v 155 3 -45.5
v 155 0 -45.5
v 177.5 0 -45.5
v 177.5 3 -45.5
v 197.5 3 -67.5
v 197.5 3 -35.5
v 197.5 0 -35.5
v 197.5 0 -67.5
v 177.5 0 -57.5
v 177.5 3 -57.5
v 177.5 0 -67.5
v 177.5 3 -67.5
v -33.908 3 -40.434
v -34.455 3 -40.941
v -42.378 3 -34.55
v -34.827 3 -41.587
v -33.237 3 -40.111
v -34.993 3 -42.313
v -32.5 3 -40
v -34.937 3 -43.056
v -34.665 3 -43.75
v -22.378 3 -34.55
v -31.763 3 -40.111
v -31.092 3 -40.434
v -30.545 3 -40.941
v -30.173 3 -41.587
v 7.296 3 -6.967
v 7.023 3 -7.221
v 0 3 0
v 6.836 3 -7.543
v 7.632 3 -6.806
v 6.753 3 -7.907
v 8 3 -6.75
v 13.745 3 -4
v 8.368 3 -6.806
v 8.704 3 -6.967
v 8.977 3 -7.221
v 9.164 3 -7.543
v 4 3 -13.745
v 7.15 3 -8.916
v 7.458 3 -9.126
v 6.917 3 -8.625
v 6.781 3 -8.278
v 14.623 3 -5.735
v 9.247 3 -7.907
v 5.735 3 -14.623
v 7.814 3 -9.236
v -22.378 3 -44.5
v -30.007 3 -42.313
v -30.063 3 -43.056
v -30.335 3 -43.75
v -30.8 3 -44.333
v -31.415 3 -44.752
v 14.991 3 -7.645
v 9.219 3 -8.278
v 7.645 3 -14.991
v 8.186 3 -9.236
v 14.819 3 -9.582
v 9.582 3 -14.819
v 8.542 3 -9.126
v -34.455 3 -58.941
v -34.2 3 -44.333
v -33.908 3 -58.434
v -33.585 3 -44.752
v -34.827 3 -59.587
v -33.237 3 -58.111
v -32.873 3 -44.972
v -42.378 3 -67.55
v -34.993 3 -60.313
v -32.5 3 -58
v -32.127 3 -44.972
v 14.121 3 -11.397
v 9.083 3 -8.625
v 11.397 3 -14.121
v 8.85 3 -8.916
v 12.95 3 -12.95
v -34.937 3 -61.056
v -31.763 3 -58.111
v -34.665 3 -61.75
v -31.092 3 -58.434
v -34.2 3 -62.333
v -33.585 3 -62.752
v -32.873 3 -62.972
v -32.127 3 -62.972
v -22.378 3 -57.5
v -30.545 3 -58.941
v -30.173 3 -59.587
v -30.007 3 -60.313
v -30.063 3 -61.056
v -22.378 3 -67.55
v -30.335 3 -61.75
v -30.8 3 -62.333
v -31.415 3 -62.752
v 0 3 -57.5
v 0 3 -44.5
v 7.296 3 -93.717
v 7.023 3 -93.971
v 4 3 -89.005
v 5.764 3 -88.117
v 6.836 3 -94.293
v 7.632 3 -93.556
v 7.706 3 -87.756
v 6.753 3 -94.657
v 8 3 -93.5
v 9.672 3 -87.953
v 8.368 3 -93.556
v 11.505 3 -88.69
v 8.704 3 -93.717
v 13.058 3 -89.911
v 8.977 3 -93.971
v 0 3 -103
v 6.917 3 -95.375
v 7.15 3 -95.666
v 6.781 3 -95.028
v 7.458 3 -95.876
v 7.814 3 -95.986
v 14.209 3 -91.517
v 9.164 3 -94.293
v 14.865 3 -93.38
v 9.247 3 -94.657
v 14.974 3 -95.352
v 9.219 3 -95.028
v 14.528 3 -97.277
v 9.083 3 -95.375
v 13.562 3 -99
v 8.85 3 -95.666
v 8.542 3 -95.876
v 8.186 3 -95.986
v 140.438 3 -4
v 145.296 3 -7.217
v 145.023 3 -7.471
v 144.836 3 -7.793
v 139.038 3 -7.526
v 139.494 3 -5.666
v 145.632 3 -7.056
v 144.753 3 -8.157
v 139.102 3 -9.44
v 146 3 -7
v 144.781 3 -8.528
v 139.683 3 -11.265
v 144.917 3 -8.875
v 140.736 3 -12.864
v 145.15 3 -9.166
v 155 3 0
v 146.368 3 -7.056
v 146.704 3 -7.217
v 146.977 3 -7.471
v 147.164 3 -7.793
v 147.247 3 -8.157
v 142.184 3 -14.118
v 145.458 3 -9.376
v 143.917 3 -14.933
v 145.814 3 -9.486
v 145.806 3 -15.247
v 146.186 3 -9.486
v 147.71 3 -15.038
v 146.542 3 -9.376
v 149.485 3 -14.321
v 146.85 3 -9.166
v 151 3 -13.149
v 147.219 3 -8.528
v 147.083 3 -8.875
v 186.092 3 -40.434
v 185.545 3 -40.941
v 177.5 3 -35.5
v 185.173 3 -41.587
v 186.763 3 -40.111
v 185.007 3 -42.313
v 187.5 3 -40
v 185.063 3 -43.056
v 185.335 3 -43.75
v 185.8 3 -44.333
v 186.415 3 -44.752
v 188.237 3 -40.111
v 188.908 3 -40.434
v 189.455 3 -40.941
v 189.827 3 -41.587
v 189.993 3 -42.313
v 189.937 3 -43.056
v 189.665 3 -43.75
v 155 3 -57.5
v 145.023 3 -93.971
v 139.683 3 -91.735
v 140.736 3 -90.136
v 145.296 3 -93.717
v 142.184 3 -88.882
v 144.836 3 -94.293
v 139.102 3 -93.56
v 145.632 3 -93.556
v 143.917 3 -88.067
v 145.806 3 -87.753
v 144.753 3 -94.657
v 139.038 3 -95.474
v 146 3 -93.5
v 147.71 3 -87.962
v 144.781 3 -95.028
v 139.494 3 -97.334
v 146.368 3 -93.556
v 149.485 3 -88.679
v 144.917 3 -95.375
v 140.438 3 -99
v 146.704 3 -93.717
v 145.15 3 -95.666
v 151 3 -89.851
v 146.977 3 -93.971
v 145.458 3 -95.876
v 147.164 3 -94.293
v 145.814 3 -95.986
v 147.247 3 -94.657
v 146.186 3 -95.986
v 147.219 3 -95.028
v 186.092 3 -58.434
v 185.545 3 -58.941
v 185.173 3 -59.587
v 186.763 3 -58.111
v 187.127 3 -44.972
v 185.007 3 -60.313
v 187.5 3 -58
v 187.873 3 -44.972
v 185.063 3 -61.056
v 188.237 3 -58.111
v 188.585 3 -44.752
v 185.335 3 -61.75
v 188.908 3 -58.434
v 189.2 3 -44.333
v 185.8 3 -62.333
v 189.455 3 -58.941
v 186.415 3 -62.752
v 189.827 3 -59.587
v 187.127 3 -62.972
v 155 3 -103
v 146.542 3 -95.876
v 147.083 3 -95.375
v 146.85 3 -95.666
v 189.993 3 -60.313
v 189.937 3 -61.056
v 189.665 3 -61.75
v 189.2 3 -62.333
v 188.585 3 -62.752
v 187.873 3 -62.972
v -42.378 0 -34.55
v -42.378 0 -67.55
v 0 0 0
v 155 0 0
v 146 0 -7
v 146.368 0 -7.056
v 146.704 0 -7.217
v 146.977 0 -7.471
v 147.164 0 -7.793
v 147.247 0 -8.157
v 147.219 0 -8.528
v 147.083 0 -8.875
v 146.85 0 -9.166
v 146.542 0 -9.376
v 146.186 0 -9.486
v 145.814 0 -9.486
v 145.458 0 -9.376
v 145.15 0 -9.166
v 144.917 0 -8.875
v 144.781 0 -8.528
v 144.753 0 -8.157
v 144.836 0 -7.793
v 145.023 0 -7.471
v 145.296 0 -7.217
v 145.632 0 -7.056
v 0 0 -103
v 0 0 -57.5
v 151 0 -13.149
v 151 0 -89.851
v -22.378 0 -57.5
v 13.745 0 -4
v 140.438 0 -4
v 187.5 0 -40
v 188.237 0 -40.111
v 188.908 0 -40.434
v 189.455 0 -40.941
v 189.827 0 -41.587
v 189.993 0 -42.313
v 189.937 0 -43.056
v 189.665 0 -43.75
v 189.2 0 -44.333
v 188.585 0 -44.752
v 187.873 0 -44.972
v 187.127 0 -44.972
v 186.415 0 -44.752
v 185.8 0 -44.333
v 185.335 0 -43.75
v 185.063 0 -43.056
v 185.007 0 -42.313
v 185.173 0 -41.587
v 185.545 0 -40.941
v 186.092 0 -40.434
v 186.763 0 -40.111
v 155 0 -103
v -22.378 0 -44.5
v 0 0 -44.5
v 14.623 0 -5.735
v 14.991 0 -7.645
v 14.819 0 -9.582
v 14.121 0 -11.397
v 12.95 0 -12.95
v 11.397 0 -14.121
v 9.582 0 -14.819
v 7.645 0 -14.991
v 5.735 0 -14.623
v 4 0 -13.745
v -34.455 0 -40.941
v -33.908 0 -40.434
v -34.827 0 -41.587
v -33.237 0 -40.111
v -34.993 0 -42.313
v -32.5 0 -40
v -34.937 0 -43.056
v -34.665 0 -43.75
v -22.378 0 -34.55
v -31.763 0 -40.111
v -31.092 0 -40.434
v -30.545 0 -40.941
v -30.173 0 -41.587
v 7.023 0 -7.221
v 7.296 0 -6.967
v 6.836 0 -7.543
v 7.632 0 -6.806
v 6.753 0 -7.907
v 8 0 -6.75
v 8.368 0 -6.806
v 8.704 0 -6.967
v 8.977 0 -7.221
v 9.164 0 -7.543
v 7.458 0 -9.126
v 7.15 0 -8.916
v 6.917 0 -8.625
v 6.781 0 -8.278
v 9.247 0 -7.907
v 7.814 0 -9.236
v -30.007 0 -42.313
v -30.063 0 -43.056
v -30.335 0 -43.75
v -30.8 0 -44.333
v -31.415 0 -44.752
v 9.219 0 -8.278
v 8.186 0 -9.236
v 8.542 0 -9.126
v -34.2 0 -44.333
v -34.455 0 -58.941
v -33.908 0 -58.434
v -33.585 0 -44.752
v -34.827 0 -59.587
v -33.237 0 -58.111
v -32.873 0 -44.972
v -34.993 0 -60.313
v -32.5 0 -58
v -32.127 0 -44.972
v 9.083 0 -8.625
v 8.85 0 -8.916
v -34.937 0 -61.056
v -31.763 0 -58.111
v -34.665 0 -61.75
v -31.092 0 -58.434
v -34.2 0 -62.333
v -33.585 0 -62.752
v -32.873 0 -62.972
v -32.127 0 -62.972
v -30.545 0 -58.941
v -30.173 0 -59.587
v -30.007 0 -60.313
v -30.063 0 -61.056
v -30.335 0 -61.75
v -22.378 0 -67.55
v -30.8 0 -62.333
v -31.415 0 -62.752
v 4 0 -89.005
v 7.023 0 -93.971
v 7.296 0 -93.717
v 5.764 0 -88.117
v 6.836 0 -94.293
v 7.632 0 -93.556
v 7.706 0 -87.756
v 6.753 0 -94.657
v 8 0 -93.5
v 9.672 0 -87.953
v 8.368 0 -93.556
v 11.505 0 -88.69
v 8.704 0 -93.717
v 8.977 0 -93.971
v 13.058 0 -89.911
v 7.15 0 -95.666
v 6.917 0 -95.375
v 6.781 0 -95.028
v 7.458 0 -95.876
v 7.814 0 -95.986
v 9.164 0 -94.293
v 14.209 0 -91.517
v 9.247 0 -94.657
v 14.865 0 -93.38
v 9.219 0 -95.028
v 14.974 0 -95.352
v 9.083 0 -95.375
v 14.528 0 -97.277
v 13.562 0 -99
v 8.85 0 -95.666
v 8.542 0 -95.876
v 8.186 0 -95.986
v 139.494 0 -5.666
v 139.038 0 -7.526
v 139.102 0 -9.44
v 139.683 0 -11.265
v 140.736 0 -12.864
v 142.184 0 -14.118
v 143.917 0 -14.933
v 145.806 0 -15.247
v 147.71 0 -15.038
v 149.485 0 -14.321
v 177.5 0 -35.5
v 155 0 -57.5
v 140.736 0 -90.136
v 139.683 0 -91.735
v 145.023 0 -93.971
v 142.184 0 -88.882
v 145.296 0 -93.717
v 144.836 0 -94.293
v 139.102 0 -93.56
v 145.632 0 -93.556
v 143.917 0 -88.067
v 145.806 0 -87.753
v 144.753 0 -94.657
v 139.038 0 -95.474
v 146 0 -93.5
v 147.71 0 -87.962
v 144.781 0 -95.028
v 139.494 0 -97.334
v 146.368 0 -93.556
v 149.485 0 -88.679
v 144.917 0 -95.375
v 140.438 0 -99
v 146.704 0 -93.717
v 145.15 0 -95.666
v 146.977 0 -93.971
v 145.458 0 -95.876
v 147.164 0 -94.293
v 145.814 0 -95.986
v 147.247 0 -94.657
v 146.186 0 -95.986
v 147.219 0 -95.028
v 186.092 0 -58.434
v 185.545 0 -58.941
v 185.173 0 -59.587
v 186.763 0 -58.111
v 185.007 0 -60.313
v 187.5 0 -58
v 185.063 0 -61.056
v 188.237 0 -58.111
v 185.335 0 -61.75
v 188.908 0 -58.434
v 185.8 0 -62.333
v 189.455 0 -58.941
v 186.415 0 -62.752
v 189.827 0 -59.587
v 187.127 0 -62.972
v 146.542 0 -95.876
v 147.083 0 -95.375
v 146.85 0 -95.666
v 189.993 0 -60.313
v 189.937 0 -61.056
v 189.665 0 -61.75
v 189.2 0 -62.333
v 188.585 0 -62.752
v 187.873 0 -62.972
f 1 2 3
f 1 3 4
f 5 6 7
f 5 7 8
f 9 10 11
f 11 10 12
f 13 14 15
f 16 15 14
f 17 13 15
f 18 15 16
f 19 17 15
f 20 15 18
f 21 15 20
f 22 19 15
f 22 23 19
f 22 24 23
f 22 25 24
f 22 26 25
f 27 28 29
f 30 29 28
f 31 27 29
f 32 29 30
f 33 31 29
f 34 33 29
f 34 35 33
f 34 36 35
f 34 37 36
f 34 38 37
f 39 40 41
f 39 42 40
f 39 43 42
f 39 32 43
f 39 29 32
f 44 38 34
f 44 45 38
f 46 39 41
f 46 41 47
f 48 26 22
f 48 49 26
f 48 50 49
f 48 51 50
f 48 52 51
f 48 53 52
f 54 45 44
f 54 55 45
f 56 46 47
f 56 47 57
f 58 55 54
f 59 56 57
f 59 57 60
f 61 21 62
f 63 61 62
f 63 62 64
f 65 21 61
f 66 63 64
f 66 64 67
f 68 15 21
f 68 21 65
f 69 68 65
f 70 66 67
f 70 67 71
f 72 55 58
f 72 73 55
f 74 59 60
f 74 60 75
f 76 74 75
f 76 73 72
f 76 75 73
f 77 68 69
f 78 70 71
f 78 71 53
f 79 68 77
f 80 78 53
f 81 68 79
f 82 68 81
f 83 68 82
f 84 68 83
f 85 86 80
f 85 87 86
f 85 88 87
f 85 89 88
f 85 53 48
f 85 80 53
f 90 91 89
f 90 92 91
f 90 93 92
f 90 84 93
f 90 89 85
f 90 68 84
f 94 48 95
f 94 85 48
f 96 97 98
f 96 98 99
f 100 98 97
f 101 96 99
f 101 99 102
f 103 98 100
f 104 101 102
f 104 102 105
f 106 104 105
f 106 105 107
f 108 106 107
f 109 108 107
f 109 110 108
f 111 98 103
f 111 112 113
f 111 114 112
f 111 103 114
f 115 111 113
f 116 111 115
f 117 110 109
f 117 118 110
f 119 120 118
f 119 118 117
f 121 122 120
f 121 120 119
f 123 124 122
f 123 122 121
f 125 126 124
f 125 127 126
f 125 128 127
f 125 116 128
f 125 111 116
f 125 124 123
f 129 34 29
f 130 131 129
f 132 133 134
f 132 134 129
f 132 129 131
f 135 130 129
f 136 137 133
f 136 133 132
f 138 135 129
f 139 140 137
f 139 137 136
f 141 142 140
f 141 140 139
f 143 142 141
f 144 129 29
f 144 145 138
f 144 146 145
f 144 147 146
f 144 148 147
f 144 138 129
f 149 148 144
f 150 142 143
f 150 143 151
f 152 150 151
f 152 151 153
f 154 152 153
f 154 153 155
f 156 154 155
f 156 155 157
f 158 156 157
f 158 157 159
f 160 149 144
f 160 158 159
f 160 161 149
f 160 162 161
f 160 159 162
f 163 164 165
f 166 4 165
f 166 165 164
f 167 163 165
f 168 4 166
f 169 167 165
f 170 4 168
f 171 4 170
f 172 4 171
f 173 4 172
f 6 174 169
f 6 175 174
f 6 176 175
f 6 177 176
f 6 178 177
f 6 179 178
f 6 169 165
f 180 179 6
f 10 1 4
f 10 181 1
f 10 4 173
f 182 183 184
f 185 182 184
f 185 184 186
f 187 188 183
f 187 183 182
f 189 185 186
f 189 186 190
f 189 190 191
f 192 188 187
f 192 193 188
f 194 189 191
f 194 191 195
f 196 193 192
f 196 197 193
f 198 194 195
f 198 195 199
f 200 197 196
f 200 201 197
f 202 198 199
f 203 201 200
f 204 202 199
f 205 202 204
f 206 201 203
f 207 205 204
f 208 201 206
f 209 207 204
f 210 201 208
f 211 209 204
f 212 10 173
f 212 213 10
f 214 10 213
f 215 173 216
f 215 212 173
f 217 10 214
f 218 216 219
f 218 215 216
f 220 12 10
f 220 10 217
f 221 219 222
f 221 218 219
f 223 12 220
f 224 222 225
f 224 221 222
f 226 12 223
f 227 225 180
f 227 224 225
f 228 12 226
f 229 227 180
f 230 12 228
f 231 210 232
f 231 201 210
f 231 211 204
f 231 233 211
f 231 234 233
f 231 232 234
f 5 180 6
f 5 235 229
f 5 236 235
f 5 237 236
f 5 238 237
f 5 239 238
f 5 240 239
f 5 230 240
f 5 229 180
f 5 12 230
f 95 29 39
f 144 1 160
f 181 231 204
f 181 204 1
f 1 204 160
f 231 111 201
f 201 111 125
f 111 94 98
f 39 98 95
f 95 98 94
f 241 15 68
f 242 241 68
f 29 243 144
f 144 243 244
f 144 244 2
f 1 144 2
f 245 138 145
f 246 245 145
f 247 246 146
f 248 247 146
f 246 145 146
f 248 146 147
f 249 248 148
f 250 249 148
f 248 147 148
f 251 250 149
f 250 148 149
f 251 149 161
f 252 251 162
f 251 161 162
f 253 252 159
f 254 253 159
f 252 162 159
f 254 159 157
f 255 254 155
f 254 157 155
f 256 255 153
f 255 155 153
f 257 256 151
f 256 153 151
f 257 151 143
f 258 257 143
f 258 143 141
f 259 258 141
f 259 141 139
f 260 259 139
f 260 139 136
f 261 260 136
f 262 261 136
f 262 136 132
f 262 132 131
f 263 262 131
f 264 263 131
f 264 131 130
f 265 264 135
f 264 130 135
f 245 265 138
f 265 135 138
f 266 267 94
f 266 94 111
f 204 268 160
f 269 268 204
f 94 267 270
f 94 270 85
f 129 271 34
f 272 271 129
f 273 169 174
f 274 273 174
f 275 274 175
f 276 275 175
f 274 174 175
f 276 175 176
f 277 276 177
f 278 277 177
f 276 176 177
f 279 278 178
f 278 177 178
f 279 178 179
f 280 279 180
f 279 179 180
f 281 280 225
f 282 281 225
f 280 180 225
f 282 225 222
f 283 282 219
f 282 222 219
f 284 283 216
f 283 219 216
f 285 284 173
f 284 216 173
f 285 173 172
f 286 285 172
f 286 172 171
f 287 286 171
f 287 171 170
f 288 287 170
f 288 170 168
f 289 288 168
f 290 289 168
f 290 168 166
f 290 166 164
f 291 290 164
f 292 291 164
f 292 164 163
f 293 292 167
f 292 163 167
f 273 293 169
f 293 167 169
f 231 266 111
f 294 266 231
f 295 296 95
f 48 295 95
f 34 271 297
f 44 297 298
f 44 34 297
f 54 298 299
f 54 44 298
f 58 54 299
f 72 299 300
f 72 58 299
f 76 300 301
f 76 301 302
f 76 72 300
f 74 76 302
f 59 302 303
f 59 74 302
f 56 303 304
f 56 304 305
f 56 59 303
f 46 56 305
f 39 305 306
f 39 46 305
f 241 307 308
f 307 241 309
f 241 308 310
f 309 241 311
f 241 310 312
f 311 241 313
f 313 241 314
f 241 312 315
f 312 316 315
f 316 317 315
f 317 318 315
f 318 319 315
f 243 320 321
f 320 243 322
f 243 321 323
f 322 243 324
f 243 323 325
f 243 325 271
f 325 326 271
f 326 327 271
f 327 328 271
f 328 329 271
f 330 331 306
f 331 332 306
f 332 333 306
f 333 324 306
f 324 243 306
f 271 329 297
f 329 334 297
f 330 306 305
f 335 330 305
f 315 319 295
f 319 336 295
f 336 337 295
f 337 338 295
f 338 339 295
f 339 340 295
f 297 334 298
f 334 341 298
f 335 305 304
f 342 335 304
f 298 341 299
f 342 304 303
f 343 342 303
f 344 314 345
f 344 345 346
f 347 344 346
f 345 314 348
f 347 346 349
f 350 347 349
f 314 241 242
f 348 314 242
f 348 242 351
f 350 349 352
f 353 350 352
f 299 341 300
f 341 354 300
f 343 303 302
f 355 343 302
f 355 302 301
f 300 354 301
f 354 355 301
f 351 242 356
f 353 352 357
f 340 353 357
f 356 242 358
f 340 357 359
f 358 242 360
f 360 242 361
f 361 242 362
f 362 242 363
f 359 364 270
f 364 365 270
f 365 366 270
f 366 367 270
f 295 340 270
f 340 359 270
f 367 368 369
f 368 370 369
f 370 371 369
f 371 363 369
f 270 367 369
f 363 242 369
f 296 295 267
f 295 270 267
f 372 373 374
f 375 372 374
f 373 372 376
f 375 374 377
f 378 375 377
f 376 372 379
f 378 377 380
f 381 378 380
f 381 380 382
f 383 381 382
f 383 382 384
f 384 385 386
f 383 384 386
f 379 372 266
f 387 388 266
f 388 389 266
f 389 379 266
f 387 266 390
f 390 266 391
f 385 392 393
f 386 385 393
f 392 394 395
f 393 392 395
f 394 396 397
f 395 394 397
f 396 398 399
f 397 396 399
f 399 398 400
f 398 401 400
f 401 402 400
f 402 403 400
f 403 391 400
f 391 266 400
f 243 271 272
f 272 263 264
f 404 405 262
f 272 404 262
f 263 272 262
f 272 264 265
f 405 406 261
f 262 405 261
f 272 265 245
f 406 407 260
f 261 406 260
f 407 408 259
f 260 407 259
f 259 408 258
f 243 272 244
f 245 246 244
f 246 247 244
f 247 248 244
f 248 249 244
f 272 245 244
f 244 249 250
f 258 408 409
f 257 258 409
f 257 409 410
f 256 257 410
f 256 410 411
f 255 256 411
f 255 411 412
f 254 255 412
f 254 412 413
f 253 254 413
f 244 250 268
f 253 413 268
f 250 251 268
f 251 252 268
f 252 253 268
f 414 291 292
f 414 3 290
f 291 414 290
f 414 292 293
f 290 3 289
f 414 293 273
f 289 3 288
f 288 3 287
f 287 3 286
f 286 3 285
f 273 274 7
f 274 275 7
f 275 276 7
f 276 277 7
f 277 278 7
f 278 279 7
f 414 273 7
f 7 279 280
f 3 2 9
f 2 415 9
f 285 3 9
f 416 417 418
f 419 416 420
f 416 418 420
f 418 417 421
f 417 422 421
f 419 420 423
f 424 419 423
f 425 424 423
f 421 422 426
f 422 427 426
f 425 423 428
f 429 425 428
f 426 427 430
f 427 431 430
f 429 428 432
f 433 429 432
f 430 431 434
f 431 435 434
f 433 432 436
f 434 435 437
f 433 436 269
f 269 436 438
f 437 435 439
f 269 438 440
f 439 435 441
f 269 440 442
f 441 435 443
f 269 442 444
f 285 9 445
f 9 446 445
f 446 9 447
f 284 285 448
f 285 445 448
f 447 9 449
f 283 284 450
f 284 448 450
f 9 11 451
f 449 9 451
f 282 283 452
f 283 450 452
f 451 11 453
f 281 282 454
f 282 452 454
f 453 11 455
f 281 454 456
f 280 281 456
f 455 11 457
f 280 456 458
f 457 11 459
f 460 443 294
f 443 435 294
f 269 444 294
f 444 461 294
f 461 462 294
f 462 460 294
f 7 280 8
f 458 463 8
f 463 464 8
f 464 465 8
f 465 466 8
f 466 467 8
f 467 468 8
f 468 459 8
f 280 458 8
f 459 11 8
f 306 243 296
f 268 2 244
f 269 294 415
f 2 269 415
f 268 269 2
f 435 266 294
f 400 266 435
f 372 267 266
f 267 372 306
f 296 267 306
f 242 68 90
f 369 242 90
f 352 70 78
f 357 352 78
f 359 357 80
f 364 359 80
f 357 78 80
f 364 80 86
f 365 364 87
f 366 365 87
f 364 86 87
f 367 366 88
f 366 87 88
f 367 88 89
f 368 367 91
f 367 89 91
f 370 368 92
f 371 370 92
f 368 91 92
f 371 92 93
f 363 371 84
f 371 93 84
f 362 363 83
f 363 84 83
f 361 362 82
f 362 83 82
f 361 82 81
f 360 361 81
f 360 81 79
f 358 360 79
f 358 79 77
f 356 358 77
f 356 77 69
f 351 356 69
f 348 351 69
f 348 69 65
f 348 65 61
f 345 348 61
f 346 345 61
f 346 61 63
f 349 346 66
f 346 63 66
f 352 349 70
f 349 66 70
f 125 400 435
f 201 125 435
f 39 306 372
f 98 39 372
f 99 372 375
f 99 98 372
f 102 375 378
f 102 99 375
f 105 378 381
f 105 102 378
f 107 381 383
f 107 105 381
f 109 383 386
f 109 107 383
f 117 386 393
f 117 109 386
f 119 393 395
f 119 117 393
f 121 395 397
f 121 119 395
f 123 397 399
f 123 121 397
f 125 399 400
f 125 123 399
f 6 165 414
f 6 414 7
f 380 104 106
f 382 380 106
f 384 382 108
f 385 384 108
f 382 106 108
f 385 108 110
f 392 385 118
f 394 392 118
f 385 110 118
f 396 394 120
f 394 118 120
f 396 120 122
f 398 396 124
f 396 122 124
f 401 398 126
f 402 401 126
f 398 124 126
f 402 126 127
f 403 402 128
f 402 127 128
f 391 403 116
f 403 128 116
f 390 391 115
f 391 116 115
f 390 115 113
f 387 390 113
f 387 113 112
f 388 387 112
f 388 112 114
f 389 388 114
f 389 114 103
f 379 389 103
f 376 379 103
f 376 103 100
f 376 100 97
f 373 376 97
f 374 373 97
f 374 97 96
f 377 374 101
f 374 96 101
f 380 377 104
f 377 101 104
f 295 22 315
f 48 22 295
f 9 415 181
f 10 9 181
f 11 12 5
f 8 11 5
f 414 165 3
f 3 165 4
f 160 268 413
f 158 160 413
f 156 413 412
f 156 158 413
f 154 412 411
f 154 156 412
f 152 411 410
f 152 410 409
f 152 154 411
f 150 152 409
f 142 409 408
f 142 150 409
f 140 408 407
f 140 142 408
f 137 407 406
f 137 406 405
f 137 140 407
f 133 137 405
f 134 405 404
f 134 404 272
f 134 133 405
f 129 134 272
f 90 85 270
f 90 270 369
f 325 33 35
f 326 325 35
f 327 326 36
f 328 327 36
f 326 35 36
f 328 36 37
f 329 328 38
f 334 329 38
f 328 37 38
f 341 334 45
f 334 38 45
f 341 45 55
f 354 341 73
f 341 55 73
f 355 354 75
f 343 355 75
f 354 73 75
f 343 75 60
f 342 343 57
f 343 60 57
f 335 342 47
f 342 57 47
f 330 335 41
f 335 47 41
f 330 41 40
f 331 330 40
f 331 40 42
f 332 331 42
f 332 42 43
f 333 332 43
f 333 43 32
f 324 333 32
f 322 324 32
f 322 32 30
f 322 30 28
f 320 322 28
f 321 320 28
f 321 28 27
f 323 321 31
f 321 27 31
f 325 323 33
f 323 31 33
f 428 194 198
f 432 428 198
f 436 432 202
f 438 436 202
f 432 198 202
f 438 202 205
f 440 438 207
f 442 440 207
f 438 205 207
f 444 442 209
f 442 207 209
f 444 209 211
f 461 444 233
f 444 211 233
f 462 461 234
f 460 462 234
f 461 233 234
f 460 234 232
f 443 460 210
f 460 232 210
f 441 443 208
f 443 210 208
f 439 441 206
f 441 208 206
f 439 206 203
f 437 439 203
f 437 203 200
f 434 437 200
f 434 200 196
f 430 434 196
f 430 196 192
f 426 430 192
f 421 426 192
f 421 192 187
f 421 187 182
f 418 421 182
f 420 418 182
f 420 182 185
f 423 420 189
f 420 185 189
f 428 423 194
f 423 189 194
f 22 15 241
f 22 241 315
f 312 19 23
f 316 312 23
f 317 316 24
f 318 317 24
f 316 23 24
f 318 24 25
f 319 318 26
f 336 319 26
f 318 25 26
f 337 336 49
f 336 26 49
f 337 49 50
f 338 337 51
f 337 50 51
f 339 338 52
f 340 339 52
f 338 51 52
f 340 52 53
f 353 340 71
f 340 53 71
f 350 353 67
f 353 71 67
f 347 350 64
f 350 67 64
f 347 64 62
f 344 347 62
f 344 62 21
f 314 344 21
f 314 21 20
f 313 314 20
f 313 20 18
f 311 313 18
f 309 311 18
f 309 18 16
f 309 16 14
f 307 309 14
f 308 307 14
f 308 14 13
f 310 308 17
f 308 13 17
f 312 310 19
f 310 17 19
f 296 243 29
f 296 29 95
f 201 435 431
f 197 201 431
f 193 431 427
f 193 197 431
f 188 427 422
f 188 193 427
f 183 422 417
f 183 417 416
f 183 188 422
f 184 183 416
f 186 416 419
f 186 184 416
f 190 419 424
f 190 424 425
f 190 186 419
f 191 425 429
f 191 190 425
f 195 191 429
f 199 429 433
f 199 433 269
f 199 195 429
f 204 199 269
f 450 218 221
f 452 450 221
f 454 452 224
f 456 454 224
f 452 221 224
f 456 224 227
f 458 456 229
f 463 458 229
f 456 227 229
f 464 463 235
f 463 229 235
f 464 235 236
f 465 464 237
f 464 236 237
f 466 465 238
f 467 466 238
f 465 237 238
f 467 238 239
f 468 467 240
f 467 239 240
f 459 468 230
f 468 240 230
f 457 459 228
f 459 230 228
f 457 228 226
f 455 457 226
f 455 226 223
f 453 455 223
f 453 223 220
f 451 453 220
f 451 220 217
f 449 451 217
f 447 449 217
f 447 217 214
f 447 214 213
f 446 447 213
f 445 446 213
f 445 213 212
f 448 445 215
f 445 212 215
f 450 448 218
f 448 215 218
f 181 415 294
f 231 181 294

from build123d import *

# Parameters (mm, degrees)
SKETCH1_W            = 155
SKETCH1_H            = 103
SKETCH1_W_2          = 147
SKETCH1_H_2          = 95
BOSS_EXTRUDE2_DEPTH  = 3
SKETCH3_W            = 13
SKETCH3_H            = 3
BOSS_EXTRUDE5_DEPTH  = 22.5
SKETCH4_W            = 12
SKETCH4_H            = 3
BOSS_EXTRUDE6_DEPTH  = 22.5
SKETCH5_W            = 20
SKETCH5_H            = 32
SKETCH5_R            = 2.5
BOSS_EXTRUDE7_DEPTH  = 3
SKETCH6_W            = 20
SKETCH6_H            = 33
SKETCH6_R            = 2.5
BOSS_EXTRUDE8_DEPTH  = 3
SKETCH2_3_R          = 7
SKETCH2_3_R_2        = 1.25
BOSS_EXTRUDE11_DEPTH = 3
SKETCH2_R            = 7
SKETCH2_R_2          = 1.25
BOSS_EXTRUDE10_DEPTH = 3


with BuildPart() as part:
    # Sketch1 → Boss-Extrude2 (new body)
    with BuildSketch(Plane(origin=(0, 0, 0), x_dir=(1, 0, 0), z_dir=(0, 1, 0))):
        with Locations((77.5, 51.5)):
            Rectangle(SKETCH1_W, SKETCH1_H)
        with Locations((77.5, 51.5)):
            Rectangle(SKETCH1_W_2, SKETCH1_H_2, mode=Mode.SUBTRACT)
    extrude(amount=BOSS_EXTRUDE2_DEPTH)

    # Sketch3 → Boss-Extrude5 (add)
    with BuildSketch(Plane.ZY):
        with Locations((-51, 1.5)):
            Rectangle(SKETCH3_W, SKETCH3_H)
    extrude(amount=BOSS_EXTRUDE5_DEPTH)

    # Sketch4 → Boss-Extrude6 (add)
    with BuildSketch(Plane(origin=(155, 0, 0), x_dir=(0, 0, -1), z_dir=(1, 0, 0))):
        with Locations((51.5, 1.5)):
            Rectangle(SKETCH4_W, SKETCH4_H)
    extrude(amount=BOSS_EXTRUDE6_DEPTH)

    # Sketch5 → Boss-Extrude7 (add)
    with BuildSketch(Plane(origin=(0, 3, 0), x_dir=(1, 0, 0), z_dir=(0, 1, 0))):
        with Locations((187.5, 51.5)):
            Rectangle(SKETCH5_W, SKETCH5_H)
        with Locations((187.5, 60.5)):
            Circle(SKETCH5_R, mode=Mode.SUBTRACT)
        with Locations((187.5, 42.5)):
            Circle(SKETCH5_R, mode=Mode.SUBTRACT)
    extrude(amount=-BOSS_EXTRUDE7_DEPTH)

    # Sketch6 → Boss-Extrude8 (add)
    with BuildSketch(Plane(origin=(0, 3, 0), x_dir=(1, 0, 0), z_dir=(0, 1, 0))):
        with Locations((-32.378431073, 51.050390221)):
            Rectangle(SKETCH6_W, SKETCH6_H)
        with Locations((-32.5, 60.5)):
            Circle(SKETCH6_R, mode=Mode.SUBTRACT)
        with Locations((-32.5, 42.5)):
            Circle(SKETCH6_R, mode=Mode.SUBTRACT)
    extrude(amount=-BOSS_EXTRUDE8_DEPTH)

    # Sketch2<3> → Boss-Extrude11 (add)
    # profile 1 of 4: a face of its own
    with BuildSketch(Plane(origin=(0, 3, 0), x_dir=(1, 0, 0), z_dir=(0, 1, 0))):
        with Locations((8, 8)):
            Circle(SKETCH2_3_R)
        with Locations((8, 8)):
            Circle(SKETCH2_3_R_2, mode=Mode.SUBTRACT)
    # profile 2 of 4: a face of its own
    with BuildSketch(Plane(origin=(0, 3, 0), x_dir=(1, 0, 0), z_dir=(0, 1, 0))):
        with Locations((146, 8.25)):
            Circle(SKETCH2_3_R)
        with Locations((146, 8.25)):
            Circle(SKETCH2_3_R_2, mode=Mode.SUBTRACT)
    # profile 3 of 4: a face of its own
    with BuildSketch(Plane(origin=(0, 3, 0), x_dir=(1, 0, 0), z_dir=(0, 1, 0))):
        with Locations((8, 94.75)):
            Circle(SKETCH2_3_R)
        with Locations((8, 94.75)):
            Circle(SKETCH2_3_R_2, mode=Mode.SUBTRACT)
    # profile 4 of 4: a face of its own
    with BuildSketch(Plane(origin=(0, 3, 0), x_dir=(1, 0, 0), z_dir=(0, 1, 0))):
        with Locations((146, 94.75)):
            Circle(SKETCH2_3_R)
        with Locations((146, 94.75)):
            Circle(SKETCH2_3_R_2, mode=Mode.SUBTRACT)
    extrude(amount=-BOSS_EXTRUDE11_DEPTH)

    # Sketch2 → Boss-Extrude10 (add)
    # profile 1 of 4: a face of its own
    with BuildSketch(Plane(origin=(0, 3, 0), x_dir=(1, 0, 0), z_dir=(0, 1, 0))):
        with Locations((8, 8)):
            Circle(SKETCH2_R)
        with Locations((8, 8)):
            Circle(SKETCH2_R_2, mode=Mode.SUBTRACT)
    # profile 2 of 4: a face of its own
    with BuildSketch(Plane(origin=(0, 3, 0), x_dir=(1, 0, 0), z_dir=(0, 1, 0))):
        with Locations((146, 8.25)):
            Circle(SKETCH2_R)
        with Locations((146, 8.25)):
            Circle(SKETCH2_R_2, mode=Mode.SUBTRACT)
    # profile 3 of 4: a face of its own
    with BuildSketch(Plane(origin=(0, 3, 0), x_dir=(1, 0, 0), z_dir=(0, 1, 0))):
        with Locations((8, 94.75)):
            Circle(SKETCH2_R)
        with Locations((8, 94.75)):
            Circle(SKETCH2_R_2, mode=Mode.SUBTRACT)
    # profile 4 of 4: a face of its own
    with BuildSketch(Plane(origin=(0, 3, 0), x_dir=(1, 0, 0), z_dir=(0, 1, 0))):
        with Locations((146, 94.75)):
            Circle(SKETCH2_R)
        with Locations((146, 94.75)):
            Circle(SKETCH2_R_2, mode=Mode.SUBTRACT)
    extrude(amount=-BOSS_EXTRUDE10_DEPTH)


solid = part.part
